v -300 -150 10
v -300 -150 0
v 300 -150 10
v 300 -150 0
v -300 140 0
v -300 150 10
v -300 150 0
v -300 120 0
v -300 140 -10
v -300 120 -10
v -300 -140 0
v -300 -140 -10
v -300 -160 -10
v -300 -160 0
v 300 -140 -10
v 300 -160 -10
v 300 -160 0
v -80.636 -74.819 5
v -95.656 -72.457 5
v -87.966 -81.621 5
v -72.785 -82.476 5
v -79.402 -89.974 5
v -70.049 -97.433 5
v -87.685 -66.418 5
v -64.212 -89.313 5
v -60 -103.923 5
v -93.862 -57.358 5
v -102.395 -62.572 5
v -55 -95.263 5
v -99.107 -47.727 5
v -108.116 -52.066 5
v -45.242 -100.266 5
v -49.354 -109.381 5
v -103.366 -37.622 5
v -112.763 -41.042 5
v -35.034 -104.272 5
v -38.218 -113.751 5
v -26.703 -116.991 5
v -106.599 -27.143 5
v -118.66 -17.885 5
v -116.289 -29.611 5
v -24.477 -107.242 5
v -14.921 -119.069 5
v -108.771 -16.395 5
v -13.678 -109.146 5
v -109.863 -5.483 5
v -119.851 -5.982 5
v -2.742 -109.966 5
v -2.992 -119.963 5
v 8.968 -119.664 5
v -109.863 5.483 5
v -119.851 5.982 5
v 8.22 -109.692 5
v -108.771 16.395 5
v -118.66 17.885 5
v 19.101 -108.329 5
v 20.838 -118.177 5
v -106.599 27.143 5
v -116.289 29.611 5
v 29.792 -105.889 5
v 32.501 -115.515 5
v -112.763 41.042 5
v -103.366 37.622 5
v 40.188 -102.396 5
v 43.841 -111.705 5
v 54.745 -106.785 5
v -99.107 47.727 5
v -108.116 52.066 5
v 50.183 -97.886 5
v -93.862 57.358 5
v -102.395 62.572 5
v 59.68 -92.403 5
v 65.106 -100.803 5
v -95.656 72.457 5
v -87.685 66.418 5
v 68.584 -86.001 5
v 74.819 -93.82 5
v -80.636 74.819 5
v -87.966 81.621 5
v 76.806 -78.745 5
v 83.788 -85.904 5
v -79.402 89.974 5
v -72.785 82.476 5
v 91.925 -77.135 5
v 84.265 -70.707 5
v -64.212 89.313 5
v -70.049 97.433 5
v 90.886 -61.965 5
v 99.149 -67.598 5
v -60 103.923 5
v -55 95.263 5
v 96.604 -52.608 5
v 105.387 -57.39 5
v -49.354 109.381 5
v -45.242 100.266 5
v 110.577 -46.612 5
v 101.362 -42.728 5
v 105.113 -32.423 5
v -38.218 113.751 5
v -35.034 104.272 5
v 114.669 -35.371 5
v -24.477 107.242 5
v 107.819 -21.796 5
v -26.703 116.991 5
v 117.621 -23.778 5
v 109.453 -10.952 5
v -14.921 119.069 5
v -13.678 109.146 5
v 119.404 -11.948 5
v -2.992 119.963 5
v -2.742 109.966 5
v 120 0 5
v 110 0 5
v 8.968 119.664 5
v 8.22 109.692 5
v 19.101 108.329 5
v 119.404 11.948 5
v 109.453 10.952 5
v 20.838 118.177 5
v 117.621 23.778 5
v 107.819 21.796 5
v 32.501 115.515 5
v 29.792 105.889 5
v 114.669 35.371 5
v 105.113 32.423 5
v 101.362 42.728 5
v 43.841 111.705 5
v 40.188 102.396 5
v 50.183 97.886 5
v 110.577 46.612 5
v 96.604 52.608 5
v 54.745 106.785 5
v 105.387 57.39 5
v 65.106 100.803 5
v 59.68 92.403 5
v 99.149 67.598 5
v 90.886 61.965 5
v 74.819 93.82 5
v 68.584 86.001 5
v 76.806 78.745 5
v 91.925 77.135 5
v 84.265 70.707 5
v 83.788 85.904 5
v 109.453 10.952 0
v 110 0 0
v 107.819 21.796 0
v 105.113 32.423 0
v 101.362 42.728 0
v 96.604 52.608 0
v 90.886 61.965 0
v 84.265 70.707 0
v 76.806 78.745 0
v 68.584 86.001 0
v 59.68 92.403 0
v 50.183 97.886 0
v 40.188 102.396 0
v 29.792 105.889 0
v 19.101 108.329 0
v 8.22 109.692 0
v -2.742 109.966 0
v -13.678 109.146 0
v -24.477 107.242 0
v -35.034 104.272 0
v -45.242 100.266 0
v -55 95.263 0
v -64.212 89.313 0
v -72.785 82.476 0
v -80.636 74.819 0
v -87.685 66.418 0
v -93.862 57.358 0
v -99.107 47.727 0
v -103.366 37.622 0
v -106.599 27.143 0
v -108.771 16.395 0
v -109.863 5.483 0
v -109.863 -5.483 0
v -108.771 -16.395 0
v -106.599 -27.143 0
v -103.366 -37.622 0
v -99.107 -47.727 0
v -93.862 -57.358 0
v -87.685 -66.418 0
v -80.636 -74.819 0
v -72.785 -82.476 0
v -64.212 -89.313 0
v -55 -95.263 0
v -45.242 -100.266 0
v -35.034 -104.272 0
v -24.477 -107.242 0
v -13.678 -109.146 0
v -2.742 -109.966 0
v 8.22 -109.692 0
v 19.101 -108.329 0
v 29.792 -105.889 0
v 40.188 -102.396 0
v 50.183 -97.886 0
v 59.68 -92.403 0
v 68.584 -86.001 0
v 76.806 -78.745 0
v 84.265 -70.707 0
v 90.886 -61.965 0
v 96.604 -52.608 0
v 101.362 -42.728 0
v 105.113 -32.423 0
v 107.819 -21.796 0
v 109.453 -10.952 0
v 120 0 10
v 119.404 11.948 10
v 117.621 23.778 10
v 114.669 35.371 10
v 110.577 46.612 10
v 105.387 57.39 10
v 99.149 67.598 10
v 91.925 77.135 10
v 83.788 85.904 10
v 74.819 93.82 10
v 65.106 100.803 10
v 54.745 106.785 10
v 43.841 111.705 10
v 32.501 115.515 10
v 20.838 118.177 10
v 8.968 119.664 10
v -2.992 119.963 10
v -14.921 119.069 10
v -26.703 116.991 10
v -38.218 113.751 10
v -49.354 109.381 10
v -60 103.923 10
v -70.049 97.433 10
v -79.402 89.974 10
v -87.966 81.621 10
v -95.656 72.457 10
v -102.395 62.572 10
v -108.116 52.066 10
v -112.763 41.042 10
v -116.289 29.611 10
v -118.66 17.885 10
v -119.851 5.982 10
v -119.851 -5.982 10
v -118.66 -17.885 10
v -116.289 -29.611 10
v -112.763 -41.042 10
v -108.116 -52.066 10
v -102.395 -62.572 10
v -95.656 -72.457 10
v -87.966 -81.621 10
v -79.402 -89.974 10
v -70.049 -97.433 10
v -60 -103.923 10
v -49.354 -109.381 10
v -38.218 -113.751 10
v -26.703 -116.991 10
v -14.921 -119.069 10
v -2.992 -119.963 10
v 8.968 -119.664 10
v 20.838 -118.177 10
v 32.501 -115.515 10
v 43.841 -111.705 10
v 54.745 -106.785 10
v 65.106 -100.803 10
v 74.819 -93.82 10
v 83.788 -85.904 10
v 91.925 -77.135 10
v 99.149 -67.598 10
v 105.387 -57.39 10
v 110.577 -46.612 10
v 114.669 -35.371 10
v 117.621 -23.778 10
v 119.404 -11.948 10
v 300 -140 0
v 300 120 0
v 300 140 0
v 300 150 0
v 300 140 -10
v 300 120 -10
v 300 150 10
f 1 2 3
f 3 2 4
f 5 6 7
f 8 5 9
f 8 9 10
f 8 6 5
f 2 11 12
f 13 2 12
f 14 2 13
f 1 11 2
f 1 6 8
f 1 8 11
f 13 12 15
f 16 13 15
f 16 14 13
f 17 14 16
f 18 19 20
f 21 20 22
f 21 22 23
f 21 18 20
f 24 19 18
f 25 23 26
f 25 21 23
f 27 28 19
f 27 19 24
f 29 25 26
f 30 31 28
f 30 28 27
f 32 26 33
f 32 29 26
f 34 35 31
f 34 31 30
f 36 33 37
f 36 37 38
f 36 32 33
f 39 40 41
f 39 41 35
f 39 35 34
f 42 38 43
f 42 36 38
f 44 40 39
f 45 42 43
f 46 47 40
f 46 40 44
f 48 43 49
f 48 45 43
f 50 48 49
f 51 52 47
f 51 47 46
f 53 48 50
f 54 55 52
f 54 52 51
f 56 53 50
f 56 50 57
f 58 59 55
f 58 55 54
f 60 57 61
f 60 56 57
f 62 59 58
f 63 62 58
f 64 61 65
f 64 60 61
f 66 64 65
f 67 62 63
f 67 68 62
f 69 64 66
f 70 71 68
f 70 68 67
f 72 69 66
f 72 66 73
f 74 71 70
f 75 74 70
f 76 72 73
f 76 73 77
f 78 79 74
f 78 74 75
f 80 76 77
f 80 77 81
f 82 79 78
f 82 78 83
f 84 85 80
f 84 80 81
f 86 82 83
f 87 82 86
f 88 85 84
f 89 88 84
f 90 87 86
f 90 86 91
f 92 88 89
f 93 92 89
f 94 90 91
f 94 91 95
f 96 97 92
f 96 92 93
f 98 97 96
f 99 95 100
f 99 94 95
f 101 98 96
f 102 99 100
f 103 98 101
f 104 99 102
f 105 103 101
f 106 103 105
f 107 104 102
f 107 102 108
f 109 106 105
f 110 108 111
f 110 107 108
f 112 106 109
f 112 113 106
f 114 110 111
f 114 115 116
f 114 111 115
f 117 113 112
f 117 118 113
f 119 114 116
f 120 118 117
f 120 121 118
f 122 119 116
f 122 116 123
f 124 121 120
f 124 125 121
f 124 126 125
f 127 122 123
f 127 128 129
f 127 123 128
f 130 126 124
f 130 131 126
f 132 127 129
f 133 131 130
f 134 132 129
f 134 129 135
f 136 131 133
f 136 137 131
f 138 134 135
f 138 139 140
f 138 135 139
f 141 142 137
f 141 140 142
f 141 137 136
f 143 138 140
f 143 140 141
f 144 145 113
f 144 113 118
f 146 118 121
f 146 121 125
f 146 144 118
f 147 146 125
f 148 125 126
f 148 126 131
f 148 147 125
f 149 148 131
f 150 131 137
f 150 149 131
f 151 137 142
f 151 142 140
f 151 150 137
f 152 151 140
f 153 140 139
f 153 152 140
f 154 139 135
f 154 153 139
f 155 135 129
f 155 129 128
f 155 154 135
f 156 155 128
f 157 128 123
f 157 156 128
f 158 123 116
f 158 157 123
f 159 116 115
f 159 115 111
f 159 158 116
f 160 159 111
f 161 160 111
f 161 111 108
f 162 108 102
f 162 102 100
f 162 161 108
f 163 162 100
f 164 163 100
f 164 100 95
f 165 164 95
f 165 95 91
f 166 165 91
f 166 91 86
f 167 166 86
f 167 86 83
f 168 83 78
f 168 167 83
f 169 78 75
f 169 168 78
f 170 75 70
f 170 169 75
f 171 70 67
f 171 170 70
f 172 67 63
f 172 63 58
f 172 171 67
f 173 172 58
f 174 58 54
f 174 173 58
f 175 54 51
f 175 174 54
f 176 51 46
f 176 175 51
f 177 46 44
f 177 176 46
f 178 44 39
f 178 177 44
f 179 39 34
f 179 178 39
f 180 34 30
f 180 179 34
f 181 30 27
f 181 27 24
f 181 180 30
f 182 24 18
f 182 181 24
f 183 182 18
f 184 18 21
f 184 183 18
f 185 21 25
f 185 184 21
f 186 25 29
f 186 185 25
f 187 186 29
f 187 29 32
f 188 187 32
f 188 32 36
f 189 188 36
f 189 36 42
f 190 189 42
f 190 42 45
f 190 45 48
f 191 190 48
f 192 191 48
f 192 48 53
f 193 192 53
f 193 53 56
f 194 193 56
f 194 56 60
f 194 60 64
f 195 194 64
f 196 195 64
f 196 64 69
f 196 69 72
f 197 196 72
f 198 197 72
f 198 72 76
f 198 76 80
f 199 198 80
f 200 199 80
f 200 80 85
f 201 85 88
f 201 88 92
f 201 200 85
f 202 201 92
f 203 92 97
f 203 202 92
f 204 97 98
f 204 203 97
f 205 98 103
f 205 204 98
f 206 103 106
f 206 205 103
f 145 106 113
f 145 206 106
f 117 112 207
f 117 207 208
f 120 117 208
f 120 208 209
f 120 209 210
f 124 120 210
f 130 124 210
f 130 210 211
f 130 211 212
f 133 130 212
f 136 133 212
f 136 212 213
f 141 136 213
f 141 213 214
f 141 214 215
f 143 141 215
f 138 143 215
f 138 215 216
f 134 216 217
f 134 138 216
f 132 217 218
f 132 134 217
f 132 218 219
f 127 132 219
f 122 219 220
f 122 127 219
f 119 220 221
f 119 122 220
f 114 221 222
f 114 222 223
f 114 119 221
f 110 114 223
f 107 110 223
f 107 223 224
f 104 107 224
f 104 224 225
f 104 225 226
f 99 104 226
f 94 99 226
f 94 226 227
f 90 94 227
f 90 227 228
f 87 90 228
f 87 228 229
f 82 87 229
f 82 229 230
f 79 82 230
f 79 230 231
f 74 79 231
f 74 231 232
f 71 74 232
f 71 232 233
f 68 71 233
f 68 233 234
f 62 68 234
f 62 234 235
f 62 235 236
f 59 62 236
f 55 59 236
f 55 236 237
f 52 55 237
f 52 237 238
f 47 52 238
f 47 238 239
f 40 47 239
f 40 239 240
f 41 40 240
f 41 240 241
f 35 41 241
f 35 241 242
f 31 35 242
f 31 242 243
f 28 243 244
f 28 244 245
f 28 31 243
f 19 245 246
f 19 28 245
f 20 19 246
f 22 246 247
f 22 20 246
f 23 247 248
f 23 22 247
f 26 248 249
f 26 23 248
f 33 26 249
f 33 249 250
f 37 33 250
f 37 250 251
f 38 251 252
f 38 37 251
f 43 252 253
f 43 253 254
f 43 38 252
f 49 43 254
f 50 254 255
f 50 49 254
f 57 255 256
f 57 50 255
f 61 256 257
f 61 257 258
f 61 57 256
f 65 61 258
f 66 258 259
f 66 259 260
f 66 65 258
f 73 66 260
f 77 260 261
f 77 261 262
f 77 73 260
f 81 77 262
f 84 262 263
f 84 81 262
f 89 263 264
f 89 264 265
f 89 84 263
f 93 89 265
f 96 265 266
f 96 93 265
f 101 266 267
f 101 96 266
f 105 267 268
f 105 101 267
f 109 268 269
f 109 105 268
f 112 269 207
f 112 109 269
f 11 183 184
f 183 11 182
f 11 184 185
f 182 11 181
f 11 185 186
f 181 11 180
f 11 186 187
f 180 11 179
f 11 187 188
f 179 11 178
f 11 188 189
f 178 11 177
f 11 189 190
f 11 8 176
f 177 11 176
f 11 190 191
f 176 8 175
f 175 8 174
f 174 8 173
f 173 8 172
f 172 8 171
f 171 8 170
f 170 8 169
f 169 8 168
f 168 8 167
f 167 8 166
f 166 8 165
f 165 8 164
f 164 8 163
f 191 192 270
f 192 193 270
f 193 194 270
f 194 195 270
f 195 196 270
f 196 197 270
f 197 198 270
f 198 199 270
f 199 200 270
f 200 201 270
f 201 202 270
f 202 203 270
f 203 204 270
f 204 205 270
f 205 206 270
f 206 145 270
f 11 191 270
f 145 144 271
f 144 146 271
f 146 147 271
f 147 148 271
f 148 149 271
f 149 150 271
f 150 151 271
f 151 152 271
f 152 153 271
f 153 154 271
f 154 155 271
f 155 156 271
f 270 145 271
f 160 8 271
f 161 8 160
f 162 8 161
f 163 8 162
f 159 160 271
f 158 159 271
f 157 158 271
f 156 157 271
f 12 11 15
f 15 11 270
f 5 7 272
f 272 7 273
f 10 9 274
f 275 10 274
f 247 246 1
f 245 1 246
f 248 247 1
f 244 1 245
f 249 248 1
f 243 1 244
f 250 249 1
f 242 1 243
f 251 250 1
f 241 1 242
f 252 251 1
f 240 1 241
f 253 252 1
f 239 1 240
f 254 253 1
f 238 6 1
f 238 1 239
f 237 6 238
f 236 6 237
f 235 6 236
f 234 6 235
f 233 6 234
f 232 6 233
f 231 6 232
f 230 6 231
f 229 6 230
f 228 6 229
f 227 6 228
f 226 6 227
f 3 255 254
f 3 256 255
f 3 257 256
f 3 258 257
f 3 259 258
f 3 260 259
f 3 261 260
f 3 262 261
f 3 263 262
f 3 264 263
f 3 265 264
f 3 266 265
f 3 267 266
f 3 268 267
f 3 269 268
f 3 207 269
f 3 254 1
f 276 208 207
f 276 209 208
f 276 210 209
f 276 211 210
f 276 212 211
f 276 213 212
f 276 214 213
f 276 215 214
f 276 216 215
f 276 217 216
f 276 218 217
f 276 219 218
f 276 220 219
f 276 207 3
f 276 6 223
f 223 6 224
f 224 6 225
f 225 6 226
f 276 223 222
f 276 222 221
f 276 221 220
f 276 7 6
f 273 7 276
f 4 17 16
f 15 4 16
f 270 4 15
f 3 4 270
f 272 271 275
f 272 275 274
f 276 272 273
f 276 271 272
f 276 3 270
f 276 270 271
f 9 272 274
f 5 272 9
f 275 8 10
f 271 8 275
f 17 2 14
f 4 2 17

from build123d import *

# Parameters (mm, degrees)
F0_W     = 600
F0_H     = 300
F0_R     = 120
F1_DEPTH = 10
F0_R_2   = 110
F2_DEPTH = 5
F3_W     = 600
F3_H     = 10
F4_DEPTH = 10


# Not quite as in the source:
# - a feature names something its author has since deleted; it is built from what else it names


with BuildPart() as f1:
    # F0 (on Top) → F1 (new body)
    with BuildSketch(Plane.XY):
        Rectangle(F0_W, F0_H)
        Circle(F0_R, mode=Mode.SUBTRACT)
    extrude(amount=F1_DEPTH)

    # F0 (on Top) → F2 (join)
    with BuildSketch(Plane.XY):
        Circle(F0_R)
        Circle(F0_R_2, mode=Mode.SUBTRACT)
    extrude(amount=F2_DEPTH)

    # F3 (on face) → F4 (join)
    with BuildSketch(Plane.XY):
        with Locations((0, -145)):
            Rectangle(F3_W, F3_H)
        with Locations((0, -155)):
            Rectangle(F3_W, F3_H)
        Polygon((300, 140), (-300, 140), (-300, 120), (-9.09e-08, 120), (300, 120), align=None)
    extrude(amount=-F4_DEPTH)


solid = f1.part
